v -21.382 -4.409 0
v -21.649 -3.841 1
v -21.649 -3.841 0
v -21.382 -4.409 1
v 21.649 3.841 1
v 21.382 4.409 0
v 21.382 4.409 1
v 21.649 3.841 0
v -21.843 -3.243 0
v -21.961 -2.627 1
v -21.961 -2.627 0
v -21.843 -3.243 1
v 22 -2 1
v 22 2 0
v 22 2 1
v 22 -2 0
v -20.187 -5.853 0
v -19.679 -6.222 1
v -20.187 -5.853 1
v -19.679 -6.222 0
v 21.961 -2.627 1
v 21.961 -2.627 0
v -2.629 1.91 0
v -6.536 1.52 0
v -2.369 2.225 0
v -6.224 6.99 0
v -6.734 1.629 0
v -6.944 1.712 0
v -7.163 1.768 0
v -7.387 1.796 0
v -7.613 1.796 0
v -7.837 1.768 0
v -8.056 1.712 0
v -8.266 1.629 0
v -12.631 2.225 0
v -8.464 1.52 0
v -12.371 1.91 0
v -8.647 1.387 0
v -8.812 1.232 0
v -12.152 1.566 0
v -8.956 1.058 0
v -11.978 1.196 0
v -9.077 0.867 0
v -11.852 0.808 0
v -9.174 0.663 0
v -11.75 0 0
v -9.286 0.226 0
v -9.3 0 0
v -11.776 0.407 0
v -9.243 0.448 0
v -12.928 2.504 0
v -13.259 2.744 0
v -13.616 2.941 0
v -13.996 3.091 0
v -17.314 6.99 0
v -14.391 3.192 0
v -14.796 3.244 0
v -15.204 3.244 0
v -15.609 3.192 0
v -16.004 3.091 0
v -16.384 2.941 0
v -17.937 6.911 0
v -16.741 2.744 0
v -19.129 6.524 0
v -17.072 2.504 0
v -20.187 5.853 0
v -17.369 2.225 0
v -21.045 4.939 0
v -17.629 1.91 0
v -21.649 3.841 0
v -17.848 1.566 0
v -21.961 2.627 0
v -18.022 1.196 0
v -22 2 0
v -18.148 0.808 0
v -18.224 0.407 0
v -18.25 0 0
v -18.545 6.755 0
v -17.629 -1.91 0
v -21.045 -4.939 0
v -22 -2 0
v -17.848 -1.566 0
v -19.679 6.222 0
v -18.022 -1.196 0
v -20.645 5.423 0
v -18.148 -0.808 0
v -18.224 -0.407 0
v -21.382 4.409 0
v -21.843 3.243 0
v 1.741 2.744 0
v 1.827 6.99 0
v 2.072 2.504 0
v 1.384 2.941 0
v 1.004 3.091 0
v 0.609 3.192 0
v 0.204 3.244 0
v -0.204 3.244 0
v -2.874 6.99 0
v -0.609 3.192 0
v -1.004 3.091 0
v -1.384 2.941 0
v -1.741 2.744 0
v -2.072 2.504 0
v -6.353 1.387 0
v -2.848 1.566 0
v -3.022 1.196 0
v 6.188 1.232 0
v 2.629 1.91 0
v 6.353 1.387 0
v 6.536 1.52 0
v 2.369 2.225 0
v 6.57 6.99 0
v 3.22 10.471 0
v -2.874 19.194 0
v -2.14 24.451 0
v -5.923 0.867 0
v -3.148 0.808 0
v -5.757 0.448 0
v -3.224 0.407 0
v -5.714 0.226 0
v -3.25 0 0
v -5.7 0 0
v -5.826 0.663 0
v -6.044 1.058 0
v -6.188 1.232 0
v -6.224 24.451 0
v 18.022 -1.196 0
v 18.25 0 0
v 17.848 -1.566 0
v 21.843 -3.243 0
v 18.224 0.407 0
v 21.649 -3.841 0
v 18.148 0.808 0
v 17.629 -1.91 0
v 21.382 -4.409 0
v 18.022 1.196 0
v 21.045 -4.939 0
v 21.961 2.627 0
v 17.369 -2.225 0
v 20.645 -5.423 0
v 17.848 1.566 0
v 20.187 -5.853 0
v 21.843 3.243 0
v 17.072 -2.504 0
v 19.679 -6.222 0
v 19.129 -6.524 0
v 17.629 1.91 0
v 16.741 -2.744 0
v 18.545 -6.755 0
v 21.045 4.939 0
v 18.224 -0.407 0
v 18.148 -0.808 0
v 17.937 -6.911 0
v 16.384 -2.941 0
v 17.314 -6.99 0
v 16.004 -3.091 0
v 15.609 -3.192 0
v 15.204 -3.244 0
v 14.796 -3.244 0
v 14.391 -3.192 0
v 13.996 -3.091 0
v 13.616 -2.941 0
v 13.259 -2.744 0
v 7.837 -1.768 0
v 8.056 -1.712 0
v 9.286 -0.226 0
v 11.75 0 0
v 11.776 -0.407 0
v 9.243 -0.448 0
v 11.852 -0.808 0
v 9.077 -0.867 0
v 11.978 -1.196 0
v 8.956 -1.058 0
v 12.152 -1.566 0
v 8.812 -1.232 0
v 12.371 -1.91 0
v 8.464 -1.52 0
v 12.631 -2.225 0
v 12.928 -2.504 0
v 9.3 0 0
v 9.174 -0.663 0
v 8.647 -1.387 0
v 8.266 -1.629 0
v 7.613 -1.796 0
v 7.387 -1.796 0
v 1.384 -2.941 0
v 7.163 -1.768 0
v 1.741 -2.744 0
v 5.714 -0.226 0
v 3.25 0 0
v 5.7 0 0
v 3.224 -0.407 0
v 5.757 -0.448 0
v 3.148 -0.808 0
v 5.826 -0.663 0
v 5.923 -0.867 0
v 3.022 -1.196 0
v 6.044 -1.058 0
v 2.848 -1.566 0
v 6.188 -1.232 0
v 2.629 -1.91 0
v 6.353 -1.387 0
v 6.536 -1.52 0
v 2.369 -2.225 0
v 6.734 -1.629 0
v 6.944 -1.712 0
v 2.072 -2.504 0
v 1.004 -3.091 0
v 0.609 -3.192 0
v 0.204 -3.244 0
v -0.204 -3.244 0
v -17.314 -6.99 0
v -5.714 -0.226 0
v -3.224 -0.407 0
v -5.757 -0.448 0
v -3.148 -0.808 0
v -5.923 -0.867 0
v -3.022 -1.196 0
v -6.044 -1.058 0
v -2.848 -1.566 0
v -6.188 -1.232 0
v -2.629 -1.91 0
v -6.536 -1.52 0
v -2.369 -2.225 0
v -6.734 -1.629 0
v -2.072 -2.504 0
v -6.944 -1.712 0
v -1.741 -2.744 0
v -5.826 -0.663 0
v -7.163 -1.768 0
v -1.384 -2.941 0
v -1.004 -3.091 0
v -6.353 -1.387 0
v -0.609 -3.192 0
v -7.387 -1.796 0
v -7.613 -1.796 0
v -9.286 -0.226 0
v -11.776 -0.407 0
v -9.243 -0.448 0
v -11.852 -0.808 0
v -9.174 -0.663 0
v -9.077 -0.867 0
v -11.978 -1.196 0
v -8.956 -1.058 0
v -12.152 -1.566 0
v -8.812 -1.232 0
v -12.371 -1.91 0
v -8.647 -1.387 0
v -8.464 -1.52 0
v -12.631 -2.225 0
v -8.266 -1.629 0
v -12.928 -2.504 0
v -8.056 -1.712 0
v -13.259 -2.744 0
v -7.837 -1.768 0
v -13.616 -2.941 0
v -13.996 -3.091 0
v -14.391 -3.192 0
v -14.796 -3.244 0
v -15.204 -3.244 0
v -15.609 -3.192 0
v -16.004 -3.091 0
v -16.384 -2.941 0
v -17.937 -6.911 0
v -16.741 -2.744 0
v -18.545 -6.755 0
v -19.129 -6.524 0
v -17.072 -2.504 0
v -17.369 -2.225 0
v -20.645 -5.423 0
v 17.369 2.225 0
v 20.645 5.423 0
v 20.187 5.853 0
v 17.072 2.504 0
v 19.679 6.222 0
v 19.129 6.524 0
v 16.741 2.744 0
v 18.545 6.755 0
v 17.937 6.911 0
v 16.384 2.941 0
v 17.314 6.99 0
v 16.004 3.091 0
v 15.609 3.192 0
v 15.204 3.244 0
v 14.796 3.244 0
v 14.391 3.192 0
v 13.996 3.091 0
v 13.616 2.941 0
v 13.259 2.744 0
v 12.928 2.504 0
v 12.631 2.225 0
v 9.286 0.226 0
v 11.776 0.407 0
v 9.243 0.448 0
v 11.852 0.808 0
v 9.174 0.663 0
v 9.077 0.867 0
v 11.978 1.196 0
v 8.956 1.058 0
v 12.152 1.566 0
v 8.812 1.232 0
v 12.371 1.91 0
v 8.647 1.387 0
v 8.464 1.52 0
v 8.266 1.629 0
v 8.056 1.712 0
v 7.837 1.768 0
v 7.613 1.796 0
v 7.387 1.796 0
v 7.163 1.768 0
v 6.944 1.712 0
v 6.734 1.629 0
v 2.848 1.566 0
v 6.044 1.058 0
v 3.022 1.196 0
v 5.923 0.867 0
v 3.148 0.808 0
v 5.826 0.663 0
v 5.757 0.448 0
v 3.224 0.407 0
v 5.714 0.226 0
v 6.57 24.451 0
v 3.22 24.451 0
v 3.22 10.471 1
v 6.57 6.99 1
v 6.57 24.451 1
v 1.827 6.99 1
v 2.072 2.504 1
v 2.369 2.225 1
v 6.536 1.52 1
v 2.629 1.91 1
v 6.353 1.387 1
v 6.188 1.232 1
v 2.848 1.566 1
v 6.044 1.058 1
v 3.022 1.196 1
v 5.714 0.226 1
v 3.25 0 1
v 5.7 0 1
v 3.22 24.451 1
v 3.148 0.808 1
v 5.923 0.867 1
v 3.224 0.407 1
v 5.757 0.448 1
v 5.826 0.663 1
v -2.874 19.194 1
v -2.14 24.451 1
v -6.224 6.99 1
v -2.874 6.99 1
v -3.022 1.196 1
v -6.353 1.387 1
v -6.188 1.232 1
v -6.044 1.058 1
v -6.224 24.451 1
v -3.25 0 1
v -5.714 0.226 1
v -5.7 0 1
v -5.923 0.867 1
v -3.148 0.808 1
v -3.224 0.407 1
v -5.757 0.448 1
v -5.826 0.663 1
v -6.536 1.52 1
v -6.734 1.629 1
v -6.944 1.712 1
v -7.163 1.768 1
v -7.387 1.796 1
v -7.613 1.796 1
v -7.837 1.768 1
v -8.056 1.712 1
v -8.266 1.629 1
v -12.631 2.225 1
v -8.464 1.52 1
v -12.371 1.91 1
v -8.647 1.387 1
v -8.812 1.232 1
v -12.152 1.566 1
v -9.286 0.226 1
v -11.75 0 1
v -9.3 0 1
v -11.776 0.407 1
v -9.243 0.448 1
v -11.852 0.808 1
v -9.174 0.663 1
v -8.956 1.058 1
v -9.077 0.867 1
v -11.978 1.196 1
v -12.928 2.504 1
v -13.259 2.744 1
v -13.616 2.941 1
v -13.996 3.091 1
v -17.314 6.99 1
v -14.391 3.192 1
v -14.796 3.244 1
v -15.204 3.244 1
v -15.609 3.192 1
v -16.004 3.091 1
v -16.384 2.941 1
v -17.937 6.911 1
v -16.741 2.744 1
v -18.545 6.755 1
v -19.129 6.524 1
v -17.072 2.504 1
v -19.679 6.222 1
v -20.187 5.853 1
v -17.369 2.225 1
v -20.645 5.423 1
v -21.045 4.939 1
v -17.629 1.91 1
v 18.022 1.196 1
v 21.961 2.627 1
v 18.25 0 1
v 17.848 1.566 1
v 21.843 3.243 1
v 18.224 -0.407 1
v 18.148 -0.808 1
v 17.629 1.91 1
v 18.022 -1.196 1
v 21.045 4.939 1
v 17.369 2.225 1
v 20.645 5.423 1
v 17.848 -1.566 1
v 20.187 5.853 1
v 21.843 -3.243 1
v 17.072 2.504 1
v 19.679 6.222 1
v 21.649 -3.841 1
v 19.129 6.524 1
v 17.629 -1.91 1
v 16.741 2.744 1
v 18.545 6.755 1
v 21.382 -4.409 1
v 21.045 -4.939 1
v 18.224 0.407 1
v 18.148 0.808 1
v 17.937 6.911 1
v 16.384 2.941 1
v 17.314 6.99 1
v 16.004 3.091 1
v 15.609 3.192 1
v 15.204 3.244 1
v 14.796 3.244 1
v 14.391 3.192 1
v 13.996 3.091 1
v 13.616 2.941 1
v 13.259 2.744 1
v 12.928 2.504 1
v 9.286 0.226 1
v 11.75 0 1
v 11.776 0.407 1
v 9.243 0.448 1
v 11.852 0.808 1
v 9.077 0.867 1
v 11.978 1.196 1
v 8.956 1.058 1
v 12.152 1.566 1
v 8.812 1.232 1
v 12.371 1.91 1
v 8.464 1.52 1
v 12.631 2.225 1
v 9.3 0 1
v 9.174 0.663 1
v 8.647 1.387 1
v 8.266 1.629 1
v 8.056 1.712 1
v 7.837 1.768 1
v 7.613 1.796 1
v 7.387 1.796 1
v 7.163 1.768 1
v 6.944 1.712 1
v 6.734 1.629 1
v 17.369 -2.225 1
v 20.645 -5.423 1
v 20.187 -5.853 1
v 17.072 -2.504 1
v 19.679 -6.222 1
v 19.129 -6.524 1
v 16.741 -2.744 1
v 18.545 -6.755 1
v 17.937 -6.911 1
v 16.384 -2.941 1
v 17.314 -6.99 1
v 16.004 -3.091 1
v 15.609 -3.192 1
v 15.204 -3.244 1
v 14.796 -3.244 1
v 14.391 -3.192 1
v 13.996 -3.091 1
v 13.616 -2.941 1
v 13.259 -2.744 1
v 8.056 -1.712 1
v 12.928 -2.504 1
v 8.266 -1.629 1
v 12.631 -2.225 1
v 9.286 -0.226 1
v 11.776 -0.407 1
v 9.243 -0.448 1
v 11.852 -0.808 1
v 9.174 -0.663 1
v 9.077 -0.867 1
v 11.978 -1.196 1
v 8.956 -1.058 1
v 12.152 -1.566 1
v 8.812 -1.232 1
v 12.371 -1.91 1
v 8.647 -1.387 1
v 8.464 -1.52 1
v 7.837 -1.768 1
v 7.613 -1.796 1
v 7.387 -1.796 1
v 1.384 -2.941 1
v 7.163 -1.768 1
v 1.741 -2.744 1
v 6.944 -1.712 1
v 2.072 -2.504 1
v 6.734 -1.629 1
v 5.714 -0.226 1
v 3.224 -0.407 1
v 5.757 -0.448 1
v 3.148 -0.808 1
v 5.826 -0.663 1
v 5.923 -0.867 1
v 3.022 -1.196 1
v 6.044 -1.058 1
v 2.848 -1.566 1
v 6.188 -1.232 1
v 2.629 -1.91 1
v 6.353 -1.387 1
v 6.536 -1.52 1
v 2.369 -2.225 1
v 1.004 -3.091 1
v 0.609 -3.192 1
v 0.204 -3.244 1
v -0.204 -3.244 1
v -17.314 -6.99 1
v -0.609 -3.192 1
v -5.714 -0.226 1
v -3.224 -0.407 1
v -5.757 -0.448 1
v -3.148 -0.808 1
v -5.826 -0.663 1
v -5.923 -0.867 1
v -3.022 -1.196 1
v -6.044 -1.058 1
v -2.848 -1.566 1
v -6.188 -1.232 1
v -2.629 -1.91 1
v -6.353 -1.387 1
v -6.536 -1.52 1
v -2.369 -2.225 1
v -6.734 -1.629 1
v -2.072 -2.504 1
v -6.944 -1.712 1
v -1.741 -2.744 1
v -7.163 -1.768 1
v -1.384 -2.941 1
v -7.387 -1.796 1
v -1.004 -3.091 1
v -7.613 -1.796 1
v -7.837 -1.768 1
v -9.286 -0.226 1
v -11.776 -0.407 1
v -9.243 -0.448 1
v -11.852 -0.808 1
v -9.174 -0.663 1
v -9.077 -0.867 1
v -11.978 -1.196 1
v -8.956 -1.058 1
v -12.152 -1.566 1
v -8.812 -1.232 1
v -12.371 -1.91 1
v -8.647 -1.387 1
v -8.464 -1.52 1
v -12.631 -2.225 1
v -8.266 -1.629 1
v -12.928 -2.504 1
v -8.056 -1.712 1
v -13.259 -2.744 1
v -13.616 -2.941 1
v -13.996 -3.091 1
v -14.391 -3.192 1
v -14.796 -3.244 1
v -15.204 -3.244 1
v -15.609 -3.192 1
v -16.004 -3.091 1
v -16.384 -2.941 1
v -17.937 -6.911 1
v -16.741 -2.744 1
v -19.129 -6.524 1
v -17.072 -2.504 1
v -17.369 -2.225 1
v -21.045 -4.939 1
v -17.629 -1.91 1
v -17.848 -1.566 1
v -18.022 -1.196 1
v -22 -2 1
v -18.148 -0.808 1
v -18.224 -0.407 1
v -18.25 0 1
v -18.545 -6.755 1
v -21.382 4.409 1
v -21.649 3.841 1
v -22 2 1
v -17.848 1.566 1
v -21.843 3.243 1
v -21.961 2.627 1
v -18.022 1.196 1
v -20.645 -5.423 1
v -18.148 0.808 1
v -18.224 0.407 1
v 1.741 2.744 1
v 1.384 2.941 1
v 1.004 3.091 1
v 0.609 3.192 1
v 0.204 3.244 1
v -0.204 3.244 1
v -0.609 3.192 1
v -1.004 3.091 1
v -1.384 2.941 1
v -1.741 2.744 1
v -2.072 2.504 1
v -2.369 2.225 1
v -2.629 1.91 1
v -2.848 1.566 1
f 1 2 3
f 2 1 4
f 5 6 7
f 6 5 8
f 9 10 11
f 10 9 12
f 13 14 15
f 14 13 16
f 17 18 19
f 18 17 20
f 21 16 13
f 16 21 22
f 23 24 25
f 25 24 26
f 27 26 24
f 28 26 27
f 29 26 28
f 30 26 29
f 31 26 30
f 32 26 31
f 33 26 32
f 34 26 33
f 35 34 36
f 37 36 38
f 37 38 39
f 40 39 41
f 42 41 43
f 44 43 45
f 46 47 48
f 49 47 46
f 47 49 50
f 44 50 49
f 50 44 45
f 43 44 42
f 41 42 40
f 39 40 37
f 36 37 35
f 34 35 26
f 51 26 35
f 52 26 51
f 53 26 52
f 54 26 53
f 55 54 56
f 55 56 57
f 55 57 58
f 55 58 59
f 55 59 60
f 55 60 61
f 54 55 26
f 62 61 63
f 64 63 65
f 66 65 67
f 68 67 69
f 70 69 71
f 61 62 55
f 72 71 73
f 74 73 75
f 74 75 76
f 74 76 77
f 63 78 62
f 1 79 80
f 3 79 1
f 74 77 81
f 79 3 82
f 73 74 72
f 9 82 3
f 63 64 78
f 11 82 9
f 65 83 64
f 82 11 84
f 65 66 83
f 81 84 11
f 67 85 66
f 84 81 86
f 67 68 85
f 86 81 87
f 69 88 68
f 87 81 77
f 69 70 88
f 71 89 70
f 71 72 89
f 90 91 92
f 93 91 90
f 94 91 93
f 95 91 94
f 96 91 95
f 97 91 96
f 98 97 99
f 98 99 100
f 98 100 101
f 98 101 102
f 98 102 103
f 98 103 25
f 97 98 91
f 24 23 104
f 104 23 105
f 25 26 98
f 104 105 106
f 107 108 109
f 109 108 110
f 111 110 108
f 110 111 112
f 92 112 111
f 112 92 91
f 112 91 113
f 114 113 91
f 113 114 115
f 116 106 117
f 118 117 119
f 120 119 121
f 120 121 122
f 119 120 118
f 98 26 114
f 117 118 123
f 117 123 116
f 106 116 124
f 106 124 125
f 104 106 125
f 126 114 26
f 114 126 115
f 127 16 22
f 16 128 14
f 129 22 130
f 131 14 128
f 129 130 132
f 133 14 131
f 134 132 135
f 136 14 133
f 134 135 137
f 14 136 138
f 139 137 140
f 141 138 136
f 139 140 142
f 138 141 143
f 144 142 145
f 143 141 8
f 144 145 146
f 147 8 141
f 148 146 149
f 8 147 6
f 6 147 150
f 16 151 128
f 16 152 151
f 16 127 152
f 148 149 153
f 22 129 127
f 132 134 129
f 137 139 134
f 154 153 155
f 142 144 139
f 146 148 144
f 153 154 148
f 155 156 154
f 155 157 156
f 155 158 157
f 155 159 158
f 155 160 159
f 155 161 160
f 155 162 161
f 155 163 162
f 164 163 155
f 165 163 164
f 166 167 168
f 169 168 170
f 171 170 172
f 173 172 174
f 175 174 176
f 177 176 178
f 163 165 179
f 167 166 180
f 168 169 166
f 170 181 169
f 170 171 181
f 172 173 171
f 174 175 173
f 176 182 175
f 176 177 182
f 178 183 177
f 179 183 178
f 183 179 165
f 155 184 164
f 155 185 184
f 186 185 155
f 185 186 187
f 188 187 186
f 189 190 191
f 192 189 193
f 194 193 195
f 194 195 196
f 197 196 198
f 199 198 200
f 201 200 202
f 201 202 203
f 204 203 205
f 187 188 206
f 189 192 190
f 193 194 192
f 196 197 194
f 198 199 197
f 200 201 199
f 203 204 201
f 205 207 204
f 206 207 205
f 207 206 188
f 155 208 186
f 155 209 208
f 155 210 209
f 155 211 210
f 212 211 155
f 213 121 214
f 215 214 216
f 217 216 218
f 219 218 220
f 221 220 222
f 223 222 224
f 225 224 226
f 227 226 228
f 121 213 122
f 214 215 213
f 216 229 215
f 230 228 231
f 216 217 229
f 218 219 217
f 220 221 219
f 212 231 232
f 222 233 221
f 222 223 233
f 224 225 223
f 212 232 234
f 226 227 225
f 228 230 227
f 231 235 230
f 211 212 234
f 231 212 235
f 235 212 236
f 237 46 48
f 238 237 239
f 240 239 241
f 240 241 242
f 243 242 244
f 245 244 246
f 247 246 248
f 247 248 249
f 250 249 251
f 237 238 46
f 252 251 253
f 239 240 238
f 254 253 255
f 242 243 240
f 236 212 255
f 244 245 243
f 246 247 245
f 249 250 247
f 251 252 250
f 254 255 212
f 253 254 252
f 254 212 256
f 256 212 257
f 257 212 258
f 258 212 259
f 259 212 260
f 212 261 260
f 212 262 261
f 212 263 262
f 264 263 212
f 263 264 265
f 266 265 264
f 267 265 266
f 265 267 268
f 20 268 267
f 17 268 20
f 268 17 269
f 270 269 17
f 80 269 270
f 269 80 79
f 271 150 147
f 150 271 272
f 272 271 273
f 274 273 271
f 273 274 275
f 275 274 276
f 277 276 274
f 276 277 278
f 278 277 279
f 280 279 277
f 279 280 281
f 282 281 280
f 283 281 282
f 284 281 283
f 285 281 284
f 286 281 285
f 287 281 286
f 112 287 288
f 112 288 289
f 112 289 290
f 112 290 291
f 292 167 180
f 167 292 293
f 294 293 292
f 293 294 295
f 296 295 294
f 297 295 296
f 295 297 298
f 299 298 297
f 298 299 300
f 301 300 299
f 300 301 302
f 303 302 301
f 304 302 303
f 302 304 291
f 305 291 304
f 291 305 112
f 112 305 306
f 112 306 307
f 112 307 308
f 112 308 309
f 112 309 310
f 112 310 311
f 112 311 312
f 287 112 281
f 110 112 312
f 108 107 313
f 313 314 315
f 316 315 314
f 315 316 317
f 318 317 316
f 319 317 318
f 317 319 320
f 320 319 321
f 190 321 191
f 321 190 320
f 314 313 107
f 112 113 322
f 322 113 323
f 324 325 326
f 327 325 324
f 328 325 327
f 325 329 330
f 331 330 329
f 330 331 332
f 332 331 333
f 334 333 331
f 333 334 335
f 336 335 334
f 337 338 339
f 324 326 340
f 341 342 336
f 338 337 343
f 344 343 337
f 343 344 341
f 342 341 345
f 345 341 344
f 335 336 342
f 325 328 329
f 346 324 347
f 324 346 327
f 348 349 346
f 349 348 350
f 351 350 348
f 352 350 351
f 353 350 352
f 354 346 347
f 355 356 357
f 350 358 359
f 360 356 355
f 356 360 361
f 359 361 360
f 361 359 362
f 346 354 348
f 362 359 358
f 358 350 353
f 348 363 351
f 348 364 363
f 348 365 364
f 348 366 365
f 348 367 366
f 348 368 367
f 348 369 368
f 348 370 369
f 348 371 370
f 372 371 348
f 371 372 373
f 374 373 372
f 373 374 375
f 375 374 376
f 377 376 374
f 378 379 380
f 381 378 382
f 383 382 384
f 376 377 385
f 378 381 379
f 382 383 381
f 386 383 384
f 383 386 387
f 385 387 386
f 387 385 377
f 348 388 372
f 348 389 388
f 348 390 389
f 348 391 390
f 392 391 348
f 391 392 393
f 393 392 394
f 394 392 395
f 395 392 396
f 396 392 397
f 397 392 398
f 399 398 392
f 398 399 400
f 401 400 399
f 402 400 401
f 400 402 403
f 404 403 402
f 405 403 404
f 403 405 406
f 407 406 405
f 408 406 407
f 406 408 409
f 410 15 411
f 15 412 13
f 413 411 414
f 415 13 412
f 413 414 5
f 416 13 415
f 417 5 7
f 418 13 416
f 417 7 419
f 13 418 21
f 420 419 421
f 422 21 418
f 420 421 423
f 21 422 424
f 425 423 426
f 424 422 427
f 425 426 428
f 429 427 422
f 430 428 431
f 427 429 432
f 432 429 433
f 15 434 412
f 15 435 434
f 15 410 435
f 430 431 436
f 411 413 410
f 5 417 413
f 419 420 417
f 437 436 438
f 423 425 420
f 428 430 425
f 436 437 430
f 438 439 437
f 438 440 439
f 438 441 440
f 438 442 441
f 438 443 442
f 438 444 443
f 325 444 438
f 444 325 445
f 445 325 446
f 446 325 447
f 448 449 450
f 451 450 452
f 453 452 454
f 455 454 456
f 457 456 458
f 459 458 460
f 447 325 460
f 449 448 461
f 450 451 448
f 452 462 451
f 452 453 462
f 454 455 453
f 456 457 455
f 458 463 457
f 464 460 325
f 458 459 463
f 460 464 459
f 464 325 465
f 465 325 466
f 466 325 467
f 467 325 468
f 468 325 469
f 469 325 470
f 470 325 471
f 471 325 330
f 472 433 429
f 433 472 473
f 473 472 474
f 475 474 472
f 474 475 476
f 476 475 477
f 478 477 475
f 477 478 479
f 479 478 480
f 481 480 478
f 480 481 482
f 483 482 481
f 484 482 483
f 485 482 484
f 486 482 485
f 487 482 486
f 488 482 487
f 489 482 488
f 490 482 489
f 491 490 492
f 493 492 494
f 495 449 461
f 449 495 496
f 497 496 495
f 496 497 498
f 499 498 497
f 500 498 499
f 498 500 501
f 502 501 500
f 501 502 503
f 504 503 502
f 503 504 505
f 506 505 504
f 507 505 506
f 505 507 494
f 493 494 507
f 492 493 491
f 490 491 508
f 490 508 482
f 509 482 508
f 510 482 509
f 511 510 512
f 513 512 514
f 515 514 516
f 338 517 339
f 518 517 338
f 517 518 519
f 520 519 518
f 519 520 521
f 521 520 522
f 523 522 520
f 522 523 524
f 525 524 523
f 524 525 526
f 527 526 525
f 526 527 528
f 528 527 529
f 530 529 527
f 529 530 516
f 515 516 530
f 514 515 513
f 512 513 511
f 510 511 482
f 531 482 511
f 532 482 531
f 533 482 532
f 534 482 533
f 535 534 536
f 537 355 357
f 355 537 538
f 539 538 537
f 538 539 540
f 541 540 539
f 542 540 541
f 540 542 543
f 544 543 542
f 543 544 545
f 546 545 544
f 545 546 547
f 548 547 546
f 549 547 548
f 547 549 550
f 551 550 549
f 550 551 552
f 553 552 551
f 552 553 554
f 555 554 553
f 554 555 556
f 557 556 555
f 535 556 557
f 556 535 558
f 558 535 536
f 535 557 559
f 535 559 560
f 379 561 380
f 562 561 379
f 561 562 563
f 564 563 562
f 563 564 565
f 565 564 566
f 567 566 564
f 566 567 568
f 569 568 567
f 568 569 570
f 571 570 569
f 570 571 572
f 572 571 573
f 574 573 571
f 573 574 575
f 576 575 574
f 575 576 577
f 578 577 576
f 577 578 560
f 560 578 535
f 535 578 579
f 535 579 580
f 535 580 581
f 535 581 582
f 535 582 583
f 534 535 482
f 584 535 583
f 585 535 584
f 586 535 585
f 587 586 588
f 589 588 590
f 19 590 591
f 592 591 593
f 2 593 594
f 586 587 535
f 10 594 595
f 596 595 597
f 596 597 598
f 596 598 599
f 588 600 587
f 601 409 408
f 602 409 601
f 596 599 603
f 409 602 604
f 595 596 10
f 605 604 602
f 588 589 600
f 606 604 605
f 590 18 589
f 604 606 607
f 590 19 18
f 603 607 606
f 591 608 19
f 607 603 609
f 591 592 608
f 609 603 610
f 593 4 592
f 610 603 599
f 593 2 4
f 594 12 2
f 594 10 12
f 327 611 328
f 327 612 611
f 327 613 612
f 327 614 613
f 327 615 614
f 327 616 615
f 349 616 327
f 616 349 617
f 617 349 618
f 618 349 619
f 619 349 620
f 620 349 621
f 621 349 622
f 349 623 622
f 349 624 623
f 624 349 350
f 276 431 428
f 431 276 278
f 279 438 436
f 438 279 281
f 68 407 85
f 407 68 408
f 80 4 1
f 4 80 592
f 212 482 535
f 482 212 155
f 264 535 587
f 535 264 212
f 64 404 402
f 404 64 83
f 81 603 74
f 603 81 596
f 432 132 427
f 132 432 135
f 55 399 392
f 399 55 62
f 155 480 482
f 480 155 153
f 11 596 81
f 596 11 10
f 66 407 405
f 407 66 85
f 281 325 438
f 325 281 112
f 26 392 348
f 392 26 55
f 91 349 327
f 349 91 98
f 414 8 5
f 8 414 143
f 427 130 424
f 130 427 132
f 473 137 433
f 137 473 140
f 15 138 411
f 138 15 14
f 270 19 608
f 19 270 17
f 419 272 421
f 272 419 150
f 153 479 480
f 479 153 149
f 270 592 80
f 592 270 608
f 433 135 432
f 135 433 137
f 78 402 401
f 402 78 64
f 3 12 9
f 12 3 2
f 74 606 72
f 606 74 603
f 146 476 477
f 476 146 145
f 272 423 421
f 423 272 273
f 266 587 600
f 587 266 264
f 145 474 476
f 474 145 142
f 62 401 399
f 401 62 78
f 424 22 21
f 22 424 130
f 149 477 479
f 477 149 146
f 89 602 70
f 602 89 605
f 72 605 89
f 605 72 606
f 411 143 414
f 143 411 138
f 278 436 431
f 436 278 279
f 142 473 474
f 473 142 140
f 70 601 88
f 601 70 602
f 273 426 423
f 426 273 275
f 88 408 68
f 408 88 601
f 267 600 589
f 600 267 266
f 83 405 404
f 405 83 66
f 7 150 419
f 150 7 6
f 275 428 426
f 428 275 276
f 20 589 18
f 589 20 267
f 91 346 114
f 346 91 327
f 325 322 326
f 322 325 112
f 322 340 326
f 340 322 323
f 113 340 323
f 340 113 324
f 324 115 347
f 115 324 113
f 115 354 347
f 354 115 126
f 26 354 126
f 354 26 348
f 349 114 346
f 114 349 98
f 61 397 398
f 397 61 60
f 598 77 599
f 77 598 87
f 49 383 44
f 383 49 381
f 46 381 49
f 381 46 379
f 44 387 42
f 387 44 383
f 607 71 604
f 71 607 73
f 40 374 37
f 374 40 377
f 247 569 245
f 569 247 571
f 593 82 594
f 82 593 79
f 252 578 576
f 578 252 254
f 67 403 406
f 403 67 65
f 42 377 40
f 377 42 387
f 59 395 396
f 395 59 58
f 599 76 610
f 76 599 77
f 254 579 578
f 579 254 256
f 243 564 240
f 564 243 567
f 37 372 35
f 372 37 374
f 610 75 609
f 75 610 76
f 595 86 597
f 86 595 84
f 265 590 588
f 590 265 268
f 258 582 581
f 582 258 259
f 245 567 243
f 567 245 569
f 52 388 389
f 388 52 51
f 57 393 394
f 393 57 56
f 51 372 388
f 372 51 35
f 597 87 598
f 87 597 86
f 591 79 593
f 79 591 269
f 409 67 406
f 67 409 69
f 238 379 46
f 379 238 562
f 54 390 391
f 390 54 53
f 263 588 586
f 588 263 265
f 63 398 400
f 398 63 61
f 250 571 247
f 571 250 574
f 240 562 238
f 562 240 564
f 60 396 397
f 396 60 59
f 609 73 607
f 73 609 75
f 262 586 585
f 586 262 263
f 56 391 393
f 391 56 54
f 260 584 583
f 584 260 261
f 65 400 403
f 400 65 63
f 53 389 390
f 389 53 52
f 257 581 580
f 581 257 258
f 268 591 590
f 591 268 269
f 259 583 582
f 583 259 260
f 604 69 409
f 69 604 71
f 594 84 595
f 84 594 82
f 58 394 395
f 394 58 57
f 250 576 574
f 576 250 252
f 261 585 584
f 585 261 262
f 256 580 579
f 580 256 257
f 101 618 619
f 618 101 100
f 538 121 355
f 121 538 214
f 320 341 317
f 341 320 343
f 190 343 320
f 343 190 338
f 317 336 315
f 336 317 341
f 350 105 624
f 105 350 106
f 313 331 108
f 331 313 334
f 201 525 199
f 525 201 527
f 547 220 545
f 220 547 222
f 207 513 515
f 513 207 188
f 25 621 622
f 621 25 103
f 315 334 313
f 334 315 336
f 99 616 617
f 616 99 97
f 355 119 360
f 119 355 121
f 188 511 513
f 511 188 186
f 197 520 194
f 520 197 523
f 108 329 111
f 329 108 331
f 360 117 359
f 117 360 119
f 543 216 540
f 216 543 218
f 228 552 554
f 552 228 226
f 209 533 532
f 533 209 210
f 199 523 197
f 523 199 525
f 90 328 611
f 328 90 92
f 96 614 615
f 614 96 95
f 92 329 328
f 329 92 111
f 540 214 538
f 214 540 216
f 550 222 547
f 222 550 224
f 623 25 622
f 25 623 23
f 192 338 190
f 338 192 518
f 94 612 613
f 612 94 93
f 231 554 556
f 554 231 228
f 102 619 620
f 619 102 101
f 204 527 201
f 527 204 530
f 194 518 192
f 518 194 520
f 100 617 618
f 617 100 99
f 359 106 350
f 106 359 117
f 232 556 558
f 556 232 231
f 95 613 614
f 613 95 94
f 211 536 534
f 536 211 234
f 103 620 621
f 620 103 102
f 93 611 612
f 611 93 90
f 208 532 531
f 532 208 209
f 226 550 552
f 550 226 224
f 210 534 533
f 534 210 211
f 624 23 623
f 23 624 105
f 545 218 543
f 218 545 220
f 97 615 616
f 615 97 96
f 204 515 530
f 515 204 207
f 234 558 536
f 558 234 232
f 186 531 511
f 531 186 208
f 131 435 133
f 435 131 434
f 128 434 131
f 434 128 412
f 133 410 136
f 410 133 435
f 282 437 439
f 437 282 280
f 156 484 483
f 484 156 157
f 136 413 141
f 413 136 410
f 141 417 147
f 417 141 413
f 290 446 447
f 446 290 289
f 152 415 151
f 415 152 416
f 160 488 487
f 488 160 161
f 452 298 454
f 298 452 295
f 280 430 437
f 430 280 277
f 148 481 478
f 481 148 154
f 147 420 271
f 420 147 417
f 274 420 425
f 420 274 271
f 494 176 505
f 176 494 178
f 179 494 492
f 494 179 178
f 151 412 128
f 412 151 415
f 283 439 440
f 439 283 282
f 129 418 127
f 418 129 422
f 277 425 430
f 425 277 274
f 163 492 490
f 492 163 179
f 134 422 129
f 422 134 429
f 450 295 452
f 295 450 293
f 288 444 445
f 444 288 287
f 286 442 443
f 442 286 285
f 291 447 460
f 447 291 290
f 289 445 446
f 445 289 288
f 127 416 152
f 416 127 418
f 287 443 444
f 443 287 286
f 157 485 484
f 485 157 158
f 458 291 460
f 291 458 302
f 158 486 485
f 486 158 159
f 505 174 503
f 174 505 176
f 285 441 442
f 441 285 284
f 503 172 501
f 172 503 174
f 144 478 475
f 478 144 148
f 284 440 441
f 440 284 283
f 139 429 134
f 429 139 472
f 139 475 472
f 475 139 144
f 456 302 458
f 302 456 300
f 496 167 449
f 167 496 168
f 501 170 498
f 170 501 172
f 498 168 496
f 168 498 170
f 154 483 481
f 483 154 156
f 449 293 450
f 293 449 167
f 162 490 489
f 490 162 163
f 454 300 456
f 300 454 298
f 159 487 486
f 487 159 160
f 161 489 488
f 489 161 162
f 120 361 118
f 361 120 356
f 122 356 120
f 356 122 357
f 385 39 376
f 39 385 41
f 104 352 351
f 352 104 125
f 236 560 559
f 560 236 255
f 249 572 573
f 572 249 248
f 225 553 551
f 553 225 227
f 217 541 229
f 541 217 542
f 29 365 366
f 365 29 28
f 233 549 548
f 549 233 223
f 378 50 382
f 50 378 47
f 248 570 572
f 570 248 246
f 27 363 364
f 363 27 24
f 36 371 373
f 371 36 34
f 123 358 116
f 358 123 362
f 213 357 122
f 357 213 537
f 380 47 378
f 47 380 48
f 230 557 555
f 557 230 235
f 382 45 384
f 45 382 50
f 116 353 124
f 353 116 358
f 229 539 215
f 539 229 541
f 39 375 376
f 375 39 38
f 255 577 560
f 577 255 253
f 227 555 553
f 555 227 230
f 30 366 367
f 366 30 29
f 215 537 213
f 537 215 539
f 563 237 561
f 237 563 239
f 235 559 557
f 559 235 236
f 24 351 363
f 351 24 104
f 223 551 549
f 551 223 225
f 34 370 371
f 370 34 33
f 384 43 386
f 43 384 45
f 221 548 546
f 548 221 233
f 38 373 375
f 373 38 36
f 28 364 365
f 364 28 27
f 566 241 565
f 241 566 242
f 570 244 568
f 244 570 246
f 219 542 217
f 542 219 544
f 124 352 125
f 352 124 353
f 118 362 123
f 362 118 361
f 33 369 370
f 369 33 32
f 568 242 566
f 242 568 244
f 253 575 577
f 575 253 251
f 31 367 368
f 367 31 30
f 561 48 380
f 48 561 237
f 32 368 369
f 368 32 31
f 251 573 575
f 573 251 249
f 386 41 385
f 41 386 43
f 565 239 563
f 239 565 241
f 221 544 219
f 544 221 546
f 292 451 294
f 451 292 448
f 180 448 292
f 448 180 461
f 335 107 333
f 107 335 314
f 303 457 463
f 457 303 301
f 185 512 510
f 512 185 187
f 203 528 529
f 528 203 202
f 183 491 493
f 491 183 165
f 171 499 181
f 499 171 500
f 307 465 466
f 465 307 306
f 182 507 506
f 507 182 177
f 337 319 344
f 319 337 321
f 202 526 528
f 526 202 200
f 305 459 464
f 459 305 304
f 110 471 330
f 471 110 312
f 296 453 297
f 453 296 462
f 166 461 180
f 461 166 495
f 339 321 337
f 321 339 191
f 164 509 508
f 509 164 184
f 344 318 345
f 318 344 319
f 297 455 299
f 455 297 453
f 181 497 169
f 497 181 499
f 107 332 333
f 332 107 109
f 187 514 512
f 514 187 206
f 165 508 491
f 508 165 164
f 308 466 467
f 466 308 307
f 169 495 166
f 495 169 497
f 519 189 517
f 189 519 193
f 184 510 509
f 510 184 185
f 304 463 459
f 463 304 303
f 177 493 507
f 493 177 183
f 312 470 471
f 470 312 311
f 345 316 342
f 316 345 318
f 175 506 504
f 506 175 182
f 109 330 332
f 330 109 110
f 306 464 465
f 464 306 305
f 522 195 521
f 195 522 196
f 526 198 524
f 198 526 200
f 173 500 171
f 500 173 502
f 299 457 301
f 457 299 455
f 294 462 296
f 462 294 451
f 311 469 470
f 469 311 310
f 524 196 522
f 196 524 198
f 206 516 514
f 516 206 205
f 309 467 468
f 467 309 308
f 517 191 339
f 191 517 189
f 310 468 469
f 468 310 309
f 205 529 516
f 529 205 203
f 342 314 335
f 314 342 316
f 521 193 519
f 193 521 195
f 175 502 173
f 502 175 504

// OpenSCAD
$fn = 50;


difference() {
	union() {
		hull() {
			translate(v = [-17.0000000000, 2.0000000000, 0]) {
				cylinder(h = 1, r = 5);
			}
			translate(v = [17.0000000000, 2.0000000000, 0]) {
				cylinder(h = 1, r = 5);
			}
			translate(v = [-17.0000000000, -2.0000000000, 0]) {
				cylinder(h = 1, r = 5);
			}
			translate(v = [17.0000000000, -2.0000000000, 0]) {
				cylinder(h = 1, r = 5);
			}
		}
		translate(v = [0, 24, 0]) {
			linear_extrude(height = 1) {
				text(font = "DejaVu Sans Mono:style=Bold", halign = "center", size = 19.0000000000, text = "N", valign = "top");
			}
		}
	}
	union() {
		translate(v = [-15.0000000000, 0.0000000000, 0]) {
			translate(v = [0, 0, -100]) {
				cylinder(h = 200, r = 3.2500000000);
			}
		}
		translate(v = [0, 0, -100]) {
			cylinder(h = 200, r = 3.2500000000);
		}
		translate(v = [15.0000000000, 0.0000000000, 0]) {
			translate(v = [0, 0, -100]) {
				cylinder(h = 200, r = 3.2500000000);
			}
		}
		translate(v = [-15.0000000000, 0.0000000000, 0]) {
			translate(v = [0, 0, -100]) {
				cylinder(h = 200, r = 1.8000000000);
			}
		}
		translate(v = [-7.5000000000, 0.0000000000, 0]) {
			translate(v = [0, 0, -100]) {
				cylinder(h = 200, r = 1.8000000000);
			}
		}
		translate(v = [0, 0, -100]) {
			cylinder(h = 200, r = 1.8000000000);
		}
		translate(v = [7.5000000000, 0.0000000000, 0]) {
			translate(v = [0, 0, -100]) {
				cylinder(h = 200, r = 1.8000000000);
			}
		}
		translate(v = [15.0000000000, 0.0000000000, 0]) {
			translate(v = [0, 0, -100]) {
				cylinder(h = 200, r = 1.8000000000);
			}
		}
	}
}
